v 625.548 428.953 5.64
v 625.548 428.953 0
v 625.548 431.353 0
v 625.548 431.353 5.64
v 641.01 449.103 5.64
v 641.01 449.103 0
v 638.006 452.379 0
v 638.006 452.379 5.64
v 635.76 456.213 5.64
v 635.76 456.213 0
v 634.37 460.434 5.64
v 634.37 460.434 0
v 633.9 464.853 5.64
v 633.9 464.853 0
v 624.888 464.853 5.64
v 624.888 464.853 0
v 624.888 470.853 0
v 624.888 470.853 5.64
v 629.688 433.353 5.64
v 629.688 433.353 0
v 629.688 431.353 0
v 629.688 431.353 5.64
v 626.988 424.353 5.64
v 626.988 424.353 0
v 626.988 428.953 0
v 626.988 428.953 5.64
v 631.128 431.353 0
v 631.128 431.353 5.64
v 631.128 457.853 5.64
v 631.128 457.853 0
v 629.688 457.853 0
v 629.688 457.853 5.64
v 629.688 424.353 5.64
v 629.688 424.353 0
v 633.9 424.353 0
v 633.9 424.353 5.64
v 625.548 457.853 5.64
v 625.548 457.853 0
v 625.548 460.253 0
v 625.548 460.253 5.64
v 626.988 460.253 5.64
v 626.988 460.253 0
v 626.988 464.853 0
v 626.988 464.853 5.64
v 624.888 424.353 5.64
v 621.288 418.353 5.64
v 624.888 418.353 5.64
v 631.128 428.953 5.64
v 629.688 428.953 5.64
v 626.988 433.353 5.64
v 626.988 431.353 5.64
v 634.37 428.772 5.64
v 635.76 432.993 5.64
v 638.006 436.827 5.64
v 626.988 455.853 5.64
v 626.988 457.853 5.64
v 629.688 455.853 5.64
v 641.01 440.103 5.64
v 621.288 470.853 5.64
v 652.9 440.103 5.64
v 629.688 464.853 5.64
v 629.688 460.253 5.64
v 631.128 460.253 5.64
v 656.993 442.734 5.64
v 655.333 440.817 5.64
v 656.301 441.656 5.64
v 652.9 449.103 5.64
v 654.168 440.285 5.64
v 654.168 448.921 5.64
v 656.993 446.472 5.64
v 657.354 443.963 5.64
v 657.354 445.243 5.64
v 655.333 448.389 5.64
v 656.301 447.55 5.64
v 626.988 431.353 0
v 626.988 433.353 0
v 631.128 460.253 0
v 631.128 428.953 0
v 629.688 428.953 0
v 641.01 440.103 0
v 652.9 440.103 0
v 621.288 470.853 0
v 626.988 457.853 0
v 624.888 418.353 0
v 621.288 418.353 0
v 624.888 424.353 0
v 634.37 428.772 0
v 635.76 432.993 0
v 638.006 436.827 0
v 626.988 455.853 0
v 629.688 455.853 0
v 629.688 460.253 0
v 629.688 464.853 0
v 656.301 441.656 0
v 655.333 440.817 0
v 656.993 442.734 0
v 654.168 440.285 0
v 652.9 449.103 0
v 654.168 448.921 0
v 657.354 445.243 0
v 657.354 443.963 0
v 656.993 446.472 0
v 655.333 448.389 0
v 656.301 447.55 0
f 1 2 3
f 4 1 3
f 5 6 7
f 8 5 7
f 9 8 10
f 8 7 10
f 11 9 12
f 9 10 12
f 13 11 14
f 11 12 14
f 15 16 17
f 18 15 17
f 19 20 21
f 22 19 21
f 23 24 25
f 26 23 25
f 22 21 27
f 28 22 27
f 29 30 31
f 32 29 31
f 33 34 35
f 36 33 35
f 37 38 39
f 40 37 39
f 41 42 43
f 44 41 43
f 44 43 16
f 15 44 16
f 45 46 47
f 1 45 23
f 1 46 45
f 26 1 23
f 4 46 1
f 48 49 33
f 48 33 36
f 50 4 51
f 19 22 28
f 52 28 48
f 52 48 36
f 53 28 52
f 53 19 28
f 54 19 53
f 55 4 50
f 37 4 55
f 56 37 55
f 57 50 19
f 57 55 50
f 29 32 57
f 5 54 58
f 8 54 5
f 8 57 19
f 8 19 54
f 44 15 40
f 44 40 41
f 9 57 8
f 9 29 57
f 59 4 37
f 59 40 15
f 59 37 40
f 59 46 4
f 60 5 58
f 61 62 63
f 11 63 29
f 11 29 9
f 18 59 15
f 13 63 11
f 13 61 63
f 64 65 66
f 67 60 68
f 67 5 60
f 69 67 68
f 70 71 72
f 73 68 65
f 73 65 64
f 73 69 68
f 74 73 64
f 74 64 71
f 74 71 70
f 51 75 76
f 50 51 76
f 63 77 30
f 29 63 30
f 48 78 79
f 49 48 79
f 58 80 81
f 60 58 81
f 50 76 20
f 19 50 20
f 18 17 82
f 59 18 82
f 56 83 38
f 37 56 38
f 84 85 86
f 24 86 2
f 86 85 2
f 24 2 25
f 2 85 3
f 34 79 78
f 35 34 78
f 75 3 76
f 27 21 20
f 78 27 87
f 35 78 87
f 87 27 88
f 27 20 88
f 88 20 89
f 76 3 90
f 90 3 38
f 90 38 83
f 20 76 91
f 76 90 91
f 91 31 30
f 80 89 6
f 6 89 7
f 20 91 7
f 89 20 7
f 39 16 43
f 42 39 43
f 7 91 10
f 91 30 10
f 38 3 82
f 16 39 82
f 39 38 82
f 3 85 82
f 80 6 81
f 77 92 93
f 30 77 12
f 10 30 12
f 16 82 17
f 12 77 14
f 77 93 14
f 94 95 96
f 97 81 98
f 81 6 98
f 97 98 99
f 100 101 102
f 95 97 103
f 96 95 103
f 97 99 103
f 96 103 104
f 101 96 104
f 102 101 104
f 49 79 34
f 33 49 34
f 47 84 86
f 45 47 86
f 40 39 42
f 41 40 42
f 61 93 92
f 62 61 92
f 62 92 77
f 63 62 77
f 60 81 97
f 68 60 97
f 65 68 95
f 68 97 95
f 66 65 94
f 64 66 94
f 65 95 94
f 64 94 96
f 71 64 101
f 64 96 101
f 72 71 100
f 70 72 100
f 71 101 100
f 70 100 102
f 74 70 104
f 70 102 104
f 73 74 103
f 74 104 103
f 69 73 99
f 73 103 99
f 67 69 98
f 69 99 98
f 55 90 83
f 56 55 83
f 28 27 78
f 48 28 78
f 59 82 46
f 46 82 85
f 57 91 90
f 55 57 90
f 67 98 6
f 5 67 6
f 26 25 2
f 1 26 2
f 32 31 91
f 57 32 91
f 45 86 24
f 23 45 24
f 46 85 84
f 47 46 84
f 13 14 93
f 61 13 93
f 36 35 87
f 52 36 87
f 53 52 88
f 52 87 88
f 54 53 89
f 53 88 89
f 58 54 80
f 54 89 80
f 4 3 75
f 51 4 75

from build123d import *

# Parameters (mm, degrees)
BOSS_EXTRUDE1_DEPTH = 5.64


with BuildPart() as part:
    # Sketch1 → Boss-Extrude1 (new body)
    with BuildSketch(Plane.XY):
        with BuildLine():
            Line((652.899853243, 449.102981641), (641.00965886, 449.102981641))
            ThreePointArc((641.00965886, 449.102981641), (635.75965886, 456.212787258), (633.899853243, 464.852981641))
            Line((633.899853243, 464.852981641), (629.688308144, 464.852981641))
            Line((629.688308144, 464.852981641), (629.688308144, 460.252981641))
            Line((629.688308144, 460.252981641), (631.128193187, 460.252981641))
            Line((631.128193187, 460.252981641), (631.128193187, 457.852930641))
            Line((631.128193187, 457.852930641), (629.688308144, 457.852930641))
            Line((629.688308144, 457.852930641), (629.688308144, 455.852930641))
            Line((629.688308144, 455.852930641), (626.988308144, 455.852930641))
            Line((626.988308144, 455.852930641), (626.988308144, 457.852930641))
            Line((626.988308144, 457.852930641), (625.548423101, 457.852930641))
            Line((625.548423101, 457.852930641), (625.548423101, 460.252981641))
            Line((625.548423101, 460.252981641), (626.988308144, 460.252981641))
            Line((626.988308144, 460.252981641), (626.988308144, 464.852981641))
            Line((626.988308144, 464.852981641), (624.888308144, 464.852981641))
            Line((624.888308144, 464.852981641), (624.888308144, 470.852981641))
            Line((624.888308144, 470.852981641), (621.288308144, 470.852981641))
            Line((621.288308144, 470.852981641), (621.288308144, 464.852981641))
            Line((621.288308144, 464.852981641), (621.288308144, 424.352981641))
            Line((621.288308144, 424.352981641), (621.288308144, 418.352981641))
            Line((621.288308144, 418.352981641), (624.888308144, 418.352981641))
            Line((624.888308144, 418.352981641), (624.888308144, 424.352981641))
            Line((624.888308144, 424.352981641), (626.988308144, 424.352981641))
            Line((626.988308144, 424.352981641), (626.988308144, 428.952981641))
            Line((626.988308144, 428.952981641), (625.548423101, 428.952981641))
            Line((625.548423101, 428.952981641), (625.548423101, 431.353032641))
            Line((625.548423101, 431.353032641), (626.988308144, 431.353032641))
            Line((626.988308144, 431.353032641), (626.988308144, 433.353032641))
            Line((626.988308144, 433.353032641), (629.688308144, 433.353032641))
            Line((629.688308144, 433.353032641), (629.688308144, 431.353032641))
            Line((629.688308144, 431.353032641), (631.128193187, 431.353032641))
            Line((631.128193187, 431.353032641), (631.128193187, 428.952981641))
            Line((631.128193187, 428.952981641), (629.688308144, 428.952981641))
            Line((629.688308144, 428.952981641), (629.688308144, 424.352981641))
            Line((629.688308144, 424.352981641), (633.899853243, 424.352981641))
            ThreePointArc((633.899853243, 424.352981641), (635.75965886, 432.993176024), (641.00965886, 440.102981641))
            Line((641.00965886, 440.102981641), (652.899853243, 440.102981641))
            ThreePointArc((652.899853243, 440.102981641), (657.399853243, 444.602981641), (652.899853243, 449.102981641))
        make_face()
    extrude(amount=BOSS_EXTRUDE1_DEPTH)


solid = part.part
